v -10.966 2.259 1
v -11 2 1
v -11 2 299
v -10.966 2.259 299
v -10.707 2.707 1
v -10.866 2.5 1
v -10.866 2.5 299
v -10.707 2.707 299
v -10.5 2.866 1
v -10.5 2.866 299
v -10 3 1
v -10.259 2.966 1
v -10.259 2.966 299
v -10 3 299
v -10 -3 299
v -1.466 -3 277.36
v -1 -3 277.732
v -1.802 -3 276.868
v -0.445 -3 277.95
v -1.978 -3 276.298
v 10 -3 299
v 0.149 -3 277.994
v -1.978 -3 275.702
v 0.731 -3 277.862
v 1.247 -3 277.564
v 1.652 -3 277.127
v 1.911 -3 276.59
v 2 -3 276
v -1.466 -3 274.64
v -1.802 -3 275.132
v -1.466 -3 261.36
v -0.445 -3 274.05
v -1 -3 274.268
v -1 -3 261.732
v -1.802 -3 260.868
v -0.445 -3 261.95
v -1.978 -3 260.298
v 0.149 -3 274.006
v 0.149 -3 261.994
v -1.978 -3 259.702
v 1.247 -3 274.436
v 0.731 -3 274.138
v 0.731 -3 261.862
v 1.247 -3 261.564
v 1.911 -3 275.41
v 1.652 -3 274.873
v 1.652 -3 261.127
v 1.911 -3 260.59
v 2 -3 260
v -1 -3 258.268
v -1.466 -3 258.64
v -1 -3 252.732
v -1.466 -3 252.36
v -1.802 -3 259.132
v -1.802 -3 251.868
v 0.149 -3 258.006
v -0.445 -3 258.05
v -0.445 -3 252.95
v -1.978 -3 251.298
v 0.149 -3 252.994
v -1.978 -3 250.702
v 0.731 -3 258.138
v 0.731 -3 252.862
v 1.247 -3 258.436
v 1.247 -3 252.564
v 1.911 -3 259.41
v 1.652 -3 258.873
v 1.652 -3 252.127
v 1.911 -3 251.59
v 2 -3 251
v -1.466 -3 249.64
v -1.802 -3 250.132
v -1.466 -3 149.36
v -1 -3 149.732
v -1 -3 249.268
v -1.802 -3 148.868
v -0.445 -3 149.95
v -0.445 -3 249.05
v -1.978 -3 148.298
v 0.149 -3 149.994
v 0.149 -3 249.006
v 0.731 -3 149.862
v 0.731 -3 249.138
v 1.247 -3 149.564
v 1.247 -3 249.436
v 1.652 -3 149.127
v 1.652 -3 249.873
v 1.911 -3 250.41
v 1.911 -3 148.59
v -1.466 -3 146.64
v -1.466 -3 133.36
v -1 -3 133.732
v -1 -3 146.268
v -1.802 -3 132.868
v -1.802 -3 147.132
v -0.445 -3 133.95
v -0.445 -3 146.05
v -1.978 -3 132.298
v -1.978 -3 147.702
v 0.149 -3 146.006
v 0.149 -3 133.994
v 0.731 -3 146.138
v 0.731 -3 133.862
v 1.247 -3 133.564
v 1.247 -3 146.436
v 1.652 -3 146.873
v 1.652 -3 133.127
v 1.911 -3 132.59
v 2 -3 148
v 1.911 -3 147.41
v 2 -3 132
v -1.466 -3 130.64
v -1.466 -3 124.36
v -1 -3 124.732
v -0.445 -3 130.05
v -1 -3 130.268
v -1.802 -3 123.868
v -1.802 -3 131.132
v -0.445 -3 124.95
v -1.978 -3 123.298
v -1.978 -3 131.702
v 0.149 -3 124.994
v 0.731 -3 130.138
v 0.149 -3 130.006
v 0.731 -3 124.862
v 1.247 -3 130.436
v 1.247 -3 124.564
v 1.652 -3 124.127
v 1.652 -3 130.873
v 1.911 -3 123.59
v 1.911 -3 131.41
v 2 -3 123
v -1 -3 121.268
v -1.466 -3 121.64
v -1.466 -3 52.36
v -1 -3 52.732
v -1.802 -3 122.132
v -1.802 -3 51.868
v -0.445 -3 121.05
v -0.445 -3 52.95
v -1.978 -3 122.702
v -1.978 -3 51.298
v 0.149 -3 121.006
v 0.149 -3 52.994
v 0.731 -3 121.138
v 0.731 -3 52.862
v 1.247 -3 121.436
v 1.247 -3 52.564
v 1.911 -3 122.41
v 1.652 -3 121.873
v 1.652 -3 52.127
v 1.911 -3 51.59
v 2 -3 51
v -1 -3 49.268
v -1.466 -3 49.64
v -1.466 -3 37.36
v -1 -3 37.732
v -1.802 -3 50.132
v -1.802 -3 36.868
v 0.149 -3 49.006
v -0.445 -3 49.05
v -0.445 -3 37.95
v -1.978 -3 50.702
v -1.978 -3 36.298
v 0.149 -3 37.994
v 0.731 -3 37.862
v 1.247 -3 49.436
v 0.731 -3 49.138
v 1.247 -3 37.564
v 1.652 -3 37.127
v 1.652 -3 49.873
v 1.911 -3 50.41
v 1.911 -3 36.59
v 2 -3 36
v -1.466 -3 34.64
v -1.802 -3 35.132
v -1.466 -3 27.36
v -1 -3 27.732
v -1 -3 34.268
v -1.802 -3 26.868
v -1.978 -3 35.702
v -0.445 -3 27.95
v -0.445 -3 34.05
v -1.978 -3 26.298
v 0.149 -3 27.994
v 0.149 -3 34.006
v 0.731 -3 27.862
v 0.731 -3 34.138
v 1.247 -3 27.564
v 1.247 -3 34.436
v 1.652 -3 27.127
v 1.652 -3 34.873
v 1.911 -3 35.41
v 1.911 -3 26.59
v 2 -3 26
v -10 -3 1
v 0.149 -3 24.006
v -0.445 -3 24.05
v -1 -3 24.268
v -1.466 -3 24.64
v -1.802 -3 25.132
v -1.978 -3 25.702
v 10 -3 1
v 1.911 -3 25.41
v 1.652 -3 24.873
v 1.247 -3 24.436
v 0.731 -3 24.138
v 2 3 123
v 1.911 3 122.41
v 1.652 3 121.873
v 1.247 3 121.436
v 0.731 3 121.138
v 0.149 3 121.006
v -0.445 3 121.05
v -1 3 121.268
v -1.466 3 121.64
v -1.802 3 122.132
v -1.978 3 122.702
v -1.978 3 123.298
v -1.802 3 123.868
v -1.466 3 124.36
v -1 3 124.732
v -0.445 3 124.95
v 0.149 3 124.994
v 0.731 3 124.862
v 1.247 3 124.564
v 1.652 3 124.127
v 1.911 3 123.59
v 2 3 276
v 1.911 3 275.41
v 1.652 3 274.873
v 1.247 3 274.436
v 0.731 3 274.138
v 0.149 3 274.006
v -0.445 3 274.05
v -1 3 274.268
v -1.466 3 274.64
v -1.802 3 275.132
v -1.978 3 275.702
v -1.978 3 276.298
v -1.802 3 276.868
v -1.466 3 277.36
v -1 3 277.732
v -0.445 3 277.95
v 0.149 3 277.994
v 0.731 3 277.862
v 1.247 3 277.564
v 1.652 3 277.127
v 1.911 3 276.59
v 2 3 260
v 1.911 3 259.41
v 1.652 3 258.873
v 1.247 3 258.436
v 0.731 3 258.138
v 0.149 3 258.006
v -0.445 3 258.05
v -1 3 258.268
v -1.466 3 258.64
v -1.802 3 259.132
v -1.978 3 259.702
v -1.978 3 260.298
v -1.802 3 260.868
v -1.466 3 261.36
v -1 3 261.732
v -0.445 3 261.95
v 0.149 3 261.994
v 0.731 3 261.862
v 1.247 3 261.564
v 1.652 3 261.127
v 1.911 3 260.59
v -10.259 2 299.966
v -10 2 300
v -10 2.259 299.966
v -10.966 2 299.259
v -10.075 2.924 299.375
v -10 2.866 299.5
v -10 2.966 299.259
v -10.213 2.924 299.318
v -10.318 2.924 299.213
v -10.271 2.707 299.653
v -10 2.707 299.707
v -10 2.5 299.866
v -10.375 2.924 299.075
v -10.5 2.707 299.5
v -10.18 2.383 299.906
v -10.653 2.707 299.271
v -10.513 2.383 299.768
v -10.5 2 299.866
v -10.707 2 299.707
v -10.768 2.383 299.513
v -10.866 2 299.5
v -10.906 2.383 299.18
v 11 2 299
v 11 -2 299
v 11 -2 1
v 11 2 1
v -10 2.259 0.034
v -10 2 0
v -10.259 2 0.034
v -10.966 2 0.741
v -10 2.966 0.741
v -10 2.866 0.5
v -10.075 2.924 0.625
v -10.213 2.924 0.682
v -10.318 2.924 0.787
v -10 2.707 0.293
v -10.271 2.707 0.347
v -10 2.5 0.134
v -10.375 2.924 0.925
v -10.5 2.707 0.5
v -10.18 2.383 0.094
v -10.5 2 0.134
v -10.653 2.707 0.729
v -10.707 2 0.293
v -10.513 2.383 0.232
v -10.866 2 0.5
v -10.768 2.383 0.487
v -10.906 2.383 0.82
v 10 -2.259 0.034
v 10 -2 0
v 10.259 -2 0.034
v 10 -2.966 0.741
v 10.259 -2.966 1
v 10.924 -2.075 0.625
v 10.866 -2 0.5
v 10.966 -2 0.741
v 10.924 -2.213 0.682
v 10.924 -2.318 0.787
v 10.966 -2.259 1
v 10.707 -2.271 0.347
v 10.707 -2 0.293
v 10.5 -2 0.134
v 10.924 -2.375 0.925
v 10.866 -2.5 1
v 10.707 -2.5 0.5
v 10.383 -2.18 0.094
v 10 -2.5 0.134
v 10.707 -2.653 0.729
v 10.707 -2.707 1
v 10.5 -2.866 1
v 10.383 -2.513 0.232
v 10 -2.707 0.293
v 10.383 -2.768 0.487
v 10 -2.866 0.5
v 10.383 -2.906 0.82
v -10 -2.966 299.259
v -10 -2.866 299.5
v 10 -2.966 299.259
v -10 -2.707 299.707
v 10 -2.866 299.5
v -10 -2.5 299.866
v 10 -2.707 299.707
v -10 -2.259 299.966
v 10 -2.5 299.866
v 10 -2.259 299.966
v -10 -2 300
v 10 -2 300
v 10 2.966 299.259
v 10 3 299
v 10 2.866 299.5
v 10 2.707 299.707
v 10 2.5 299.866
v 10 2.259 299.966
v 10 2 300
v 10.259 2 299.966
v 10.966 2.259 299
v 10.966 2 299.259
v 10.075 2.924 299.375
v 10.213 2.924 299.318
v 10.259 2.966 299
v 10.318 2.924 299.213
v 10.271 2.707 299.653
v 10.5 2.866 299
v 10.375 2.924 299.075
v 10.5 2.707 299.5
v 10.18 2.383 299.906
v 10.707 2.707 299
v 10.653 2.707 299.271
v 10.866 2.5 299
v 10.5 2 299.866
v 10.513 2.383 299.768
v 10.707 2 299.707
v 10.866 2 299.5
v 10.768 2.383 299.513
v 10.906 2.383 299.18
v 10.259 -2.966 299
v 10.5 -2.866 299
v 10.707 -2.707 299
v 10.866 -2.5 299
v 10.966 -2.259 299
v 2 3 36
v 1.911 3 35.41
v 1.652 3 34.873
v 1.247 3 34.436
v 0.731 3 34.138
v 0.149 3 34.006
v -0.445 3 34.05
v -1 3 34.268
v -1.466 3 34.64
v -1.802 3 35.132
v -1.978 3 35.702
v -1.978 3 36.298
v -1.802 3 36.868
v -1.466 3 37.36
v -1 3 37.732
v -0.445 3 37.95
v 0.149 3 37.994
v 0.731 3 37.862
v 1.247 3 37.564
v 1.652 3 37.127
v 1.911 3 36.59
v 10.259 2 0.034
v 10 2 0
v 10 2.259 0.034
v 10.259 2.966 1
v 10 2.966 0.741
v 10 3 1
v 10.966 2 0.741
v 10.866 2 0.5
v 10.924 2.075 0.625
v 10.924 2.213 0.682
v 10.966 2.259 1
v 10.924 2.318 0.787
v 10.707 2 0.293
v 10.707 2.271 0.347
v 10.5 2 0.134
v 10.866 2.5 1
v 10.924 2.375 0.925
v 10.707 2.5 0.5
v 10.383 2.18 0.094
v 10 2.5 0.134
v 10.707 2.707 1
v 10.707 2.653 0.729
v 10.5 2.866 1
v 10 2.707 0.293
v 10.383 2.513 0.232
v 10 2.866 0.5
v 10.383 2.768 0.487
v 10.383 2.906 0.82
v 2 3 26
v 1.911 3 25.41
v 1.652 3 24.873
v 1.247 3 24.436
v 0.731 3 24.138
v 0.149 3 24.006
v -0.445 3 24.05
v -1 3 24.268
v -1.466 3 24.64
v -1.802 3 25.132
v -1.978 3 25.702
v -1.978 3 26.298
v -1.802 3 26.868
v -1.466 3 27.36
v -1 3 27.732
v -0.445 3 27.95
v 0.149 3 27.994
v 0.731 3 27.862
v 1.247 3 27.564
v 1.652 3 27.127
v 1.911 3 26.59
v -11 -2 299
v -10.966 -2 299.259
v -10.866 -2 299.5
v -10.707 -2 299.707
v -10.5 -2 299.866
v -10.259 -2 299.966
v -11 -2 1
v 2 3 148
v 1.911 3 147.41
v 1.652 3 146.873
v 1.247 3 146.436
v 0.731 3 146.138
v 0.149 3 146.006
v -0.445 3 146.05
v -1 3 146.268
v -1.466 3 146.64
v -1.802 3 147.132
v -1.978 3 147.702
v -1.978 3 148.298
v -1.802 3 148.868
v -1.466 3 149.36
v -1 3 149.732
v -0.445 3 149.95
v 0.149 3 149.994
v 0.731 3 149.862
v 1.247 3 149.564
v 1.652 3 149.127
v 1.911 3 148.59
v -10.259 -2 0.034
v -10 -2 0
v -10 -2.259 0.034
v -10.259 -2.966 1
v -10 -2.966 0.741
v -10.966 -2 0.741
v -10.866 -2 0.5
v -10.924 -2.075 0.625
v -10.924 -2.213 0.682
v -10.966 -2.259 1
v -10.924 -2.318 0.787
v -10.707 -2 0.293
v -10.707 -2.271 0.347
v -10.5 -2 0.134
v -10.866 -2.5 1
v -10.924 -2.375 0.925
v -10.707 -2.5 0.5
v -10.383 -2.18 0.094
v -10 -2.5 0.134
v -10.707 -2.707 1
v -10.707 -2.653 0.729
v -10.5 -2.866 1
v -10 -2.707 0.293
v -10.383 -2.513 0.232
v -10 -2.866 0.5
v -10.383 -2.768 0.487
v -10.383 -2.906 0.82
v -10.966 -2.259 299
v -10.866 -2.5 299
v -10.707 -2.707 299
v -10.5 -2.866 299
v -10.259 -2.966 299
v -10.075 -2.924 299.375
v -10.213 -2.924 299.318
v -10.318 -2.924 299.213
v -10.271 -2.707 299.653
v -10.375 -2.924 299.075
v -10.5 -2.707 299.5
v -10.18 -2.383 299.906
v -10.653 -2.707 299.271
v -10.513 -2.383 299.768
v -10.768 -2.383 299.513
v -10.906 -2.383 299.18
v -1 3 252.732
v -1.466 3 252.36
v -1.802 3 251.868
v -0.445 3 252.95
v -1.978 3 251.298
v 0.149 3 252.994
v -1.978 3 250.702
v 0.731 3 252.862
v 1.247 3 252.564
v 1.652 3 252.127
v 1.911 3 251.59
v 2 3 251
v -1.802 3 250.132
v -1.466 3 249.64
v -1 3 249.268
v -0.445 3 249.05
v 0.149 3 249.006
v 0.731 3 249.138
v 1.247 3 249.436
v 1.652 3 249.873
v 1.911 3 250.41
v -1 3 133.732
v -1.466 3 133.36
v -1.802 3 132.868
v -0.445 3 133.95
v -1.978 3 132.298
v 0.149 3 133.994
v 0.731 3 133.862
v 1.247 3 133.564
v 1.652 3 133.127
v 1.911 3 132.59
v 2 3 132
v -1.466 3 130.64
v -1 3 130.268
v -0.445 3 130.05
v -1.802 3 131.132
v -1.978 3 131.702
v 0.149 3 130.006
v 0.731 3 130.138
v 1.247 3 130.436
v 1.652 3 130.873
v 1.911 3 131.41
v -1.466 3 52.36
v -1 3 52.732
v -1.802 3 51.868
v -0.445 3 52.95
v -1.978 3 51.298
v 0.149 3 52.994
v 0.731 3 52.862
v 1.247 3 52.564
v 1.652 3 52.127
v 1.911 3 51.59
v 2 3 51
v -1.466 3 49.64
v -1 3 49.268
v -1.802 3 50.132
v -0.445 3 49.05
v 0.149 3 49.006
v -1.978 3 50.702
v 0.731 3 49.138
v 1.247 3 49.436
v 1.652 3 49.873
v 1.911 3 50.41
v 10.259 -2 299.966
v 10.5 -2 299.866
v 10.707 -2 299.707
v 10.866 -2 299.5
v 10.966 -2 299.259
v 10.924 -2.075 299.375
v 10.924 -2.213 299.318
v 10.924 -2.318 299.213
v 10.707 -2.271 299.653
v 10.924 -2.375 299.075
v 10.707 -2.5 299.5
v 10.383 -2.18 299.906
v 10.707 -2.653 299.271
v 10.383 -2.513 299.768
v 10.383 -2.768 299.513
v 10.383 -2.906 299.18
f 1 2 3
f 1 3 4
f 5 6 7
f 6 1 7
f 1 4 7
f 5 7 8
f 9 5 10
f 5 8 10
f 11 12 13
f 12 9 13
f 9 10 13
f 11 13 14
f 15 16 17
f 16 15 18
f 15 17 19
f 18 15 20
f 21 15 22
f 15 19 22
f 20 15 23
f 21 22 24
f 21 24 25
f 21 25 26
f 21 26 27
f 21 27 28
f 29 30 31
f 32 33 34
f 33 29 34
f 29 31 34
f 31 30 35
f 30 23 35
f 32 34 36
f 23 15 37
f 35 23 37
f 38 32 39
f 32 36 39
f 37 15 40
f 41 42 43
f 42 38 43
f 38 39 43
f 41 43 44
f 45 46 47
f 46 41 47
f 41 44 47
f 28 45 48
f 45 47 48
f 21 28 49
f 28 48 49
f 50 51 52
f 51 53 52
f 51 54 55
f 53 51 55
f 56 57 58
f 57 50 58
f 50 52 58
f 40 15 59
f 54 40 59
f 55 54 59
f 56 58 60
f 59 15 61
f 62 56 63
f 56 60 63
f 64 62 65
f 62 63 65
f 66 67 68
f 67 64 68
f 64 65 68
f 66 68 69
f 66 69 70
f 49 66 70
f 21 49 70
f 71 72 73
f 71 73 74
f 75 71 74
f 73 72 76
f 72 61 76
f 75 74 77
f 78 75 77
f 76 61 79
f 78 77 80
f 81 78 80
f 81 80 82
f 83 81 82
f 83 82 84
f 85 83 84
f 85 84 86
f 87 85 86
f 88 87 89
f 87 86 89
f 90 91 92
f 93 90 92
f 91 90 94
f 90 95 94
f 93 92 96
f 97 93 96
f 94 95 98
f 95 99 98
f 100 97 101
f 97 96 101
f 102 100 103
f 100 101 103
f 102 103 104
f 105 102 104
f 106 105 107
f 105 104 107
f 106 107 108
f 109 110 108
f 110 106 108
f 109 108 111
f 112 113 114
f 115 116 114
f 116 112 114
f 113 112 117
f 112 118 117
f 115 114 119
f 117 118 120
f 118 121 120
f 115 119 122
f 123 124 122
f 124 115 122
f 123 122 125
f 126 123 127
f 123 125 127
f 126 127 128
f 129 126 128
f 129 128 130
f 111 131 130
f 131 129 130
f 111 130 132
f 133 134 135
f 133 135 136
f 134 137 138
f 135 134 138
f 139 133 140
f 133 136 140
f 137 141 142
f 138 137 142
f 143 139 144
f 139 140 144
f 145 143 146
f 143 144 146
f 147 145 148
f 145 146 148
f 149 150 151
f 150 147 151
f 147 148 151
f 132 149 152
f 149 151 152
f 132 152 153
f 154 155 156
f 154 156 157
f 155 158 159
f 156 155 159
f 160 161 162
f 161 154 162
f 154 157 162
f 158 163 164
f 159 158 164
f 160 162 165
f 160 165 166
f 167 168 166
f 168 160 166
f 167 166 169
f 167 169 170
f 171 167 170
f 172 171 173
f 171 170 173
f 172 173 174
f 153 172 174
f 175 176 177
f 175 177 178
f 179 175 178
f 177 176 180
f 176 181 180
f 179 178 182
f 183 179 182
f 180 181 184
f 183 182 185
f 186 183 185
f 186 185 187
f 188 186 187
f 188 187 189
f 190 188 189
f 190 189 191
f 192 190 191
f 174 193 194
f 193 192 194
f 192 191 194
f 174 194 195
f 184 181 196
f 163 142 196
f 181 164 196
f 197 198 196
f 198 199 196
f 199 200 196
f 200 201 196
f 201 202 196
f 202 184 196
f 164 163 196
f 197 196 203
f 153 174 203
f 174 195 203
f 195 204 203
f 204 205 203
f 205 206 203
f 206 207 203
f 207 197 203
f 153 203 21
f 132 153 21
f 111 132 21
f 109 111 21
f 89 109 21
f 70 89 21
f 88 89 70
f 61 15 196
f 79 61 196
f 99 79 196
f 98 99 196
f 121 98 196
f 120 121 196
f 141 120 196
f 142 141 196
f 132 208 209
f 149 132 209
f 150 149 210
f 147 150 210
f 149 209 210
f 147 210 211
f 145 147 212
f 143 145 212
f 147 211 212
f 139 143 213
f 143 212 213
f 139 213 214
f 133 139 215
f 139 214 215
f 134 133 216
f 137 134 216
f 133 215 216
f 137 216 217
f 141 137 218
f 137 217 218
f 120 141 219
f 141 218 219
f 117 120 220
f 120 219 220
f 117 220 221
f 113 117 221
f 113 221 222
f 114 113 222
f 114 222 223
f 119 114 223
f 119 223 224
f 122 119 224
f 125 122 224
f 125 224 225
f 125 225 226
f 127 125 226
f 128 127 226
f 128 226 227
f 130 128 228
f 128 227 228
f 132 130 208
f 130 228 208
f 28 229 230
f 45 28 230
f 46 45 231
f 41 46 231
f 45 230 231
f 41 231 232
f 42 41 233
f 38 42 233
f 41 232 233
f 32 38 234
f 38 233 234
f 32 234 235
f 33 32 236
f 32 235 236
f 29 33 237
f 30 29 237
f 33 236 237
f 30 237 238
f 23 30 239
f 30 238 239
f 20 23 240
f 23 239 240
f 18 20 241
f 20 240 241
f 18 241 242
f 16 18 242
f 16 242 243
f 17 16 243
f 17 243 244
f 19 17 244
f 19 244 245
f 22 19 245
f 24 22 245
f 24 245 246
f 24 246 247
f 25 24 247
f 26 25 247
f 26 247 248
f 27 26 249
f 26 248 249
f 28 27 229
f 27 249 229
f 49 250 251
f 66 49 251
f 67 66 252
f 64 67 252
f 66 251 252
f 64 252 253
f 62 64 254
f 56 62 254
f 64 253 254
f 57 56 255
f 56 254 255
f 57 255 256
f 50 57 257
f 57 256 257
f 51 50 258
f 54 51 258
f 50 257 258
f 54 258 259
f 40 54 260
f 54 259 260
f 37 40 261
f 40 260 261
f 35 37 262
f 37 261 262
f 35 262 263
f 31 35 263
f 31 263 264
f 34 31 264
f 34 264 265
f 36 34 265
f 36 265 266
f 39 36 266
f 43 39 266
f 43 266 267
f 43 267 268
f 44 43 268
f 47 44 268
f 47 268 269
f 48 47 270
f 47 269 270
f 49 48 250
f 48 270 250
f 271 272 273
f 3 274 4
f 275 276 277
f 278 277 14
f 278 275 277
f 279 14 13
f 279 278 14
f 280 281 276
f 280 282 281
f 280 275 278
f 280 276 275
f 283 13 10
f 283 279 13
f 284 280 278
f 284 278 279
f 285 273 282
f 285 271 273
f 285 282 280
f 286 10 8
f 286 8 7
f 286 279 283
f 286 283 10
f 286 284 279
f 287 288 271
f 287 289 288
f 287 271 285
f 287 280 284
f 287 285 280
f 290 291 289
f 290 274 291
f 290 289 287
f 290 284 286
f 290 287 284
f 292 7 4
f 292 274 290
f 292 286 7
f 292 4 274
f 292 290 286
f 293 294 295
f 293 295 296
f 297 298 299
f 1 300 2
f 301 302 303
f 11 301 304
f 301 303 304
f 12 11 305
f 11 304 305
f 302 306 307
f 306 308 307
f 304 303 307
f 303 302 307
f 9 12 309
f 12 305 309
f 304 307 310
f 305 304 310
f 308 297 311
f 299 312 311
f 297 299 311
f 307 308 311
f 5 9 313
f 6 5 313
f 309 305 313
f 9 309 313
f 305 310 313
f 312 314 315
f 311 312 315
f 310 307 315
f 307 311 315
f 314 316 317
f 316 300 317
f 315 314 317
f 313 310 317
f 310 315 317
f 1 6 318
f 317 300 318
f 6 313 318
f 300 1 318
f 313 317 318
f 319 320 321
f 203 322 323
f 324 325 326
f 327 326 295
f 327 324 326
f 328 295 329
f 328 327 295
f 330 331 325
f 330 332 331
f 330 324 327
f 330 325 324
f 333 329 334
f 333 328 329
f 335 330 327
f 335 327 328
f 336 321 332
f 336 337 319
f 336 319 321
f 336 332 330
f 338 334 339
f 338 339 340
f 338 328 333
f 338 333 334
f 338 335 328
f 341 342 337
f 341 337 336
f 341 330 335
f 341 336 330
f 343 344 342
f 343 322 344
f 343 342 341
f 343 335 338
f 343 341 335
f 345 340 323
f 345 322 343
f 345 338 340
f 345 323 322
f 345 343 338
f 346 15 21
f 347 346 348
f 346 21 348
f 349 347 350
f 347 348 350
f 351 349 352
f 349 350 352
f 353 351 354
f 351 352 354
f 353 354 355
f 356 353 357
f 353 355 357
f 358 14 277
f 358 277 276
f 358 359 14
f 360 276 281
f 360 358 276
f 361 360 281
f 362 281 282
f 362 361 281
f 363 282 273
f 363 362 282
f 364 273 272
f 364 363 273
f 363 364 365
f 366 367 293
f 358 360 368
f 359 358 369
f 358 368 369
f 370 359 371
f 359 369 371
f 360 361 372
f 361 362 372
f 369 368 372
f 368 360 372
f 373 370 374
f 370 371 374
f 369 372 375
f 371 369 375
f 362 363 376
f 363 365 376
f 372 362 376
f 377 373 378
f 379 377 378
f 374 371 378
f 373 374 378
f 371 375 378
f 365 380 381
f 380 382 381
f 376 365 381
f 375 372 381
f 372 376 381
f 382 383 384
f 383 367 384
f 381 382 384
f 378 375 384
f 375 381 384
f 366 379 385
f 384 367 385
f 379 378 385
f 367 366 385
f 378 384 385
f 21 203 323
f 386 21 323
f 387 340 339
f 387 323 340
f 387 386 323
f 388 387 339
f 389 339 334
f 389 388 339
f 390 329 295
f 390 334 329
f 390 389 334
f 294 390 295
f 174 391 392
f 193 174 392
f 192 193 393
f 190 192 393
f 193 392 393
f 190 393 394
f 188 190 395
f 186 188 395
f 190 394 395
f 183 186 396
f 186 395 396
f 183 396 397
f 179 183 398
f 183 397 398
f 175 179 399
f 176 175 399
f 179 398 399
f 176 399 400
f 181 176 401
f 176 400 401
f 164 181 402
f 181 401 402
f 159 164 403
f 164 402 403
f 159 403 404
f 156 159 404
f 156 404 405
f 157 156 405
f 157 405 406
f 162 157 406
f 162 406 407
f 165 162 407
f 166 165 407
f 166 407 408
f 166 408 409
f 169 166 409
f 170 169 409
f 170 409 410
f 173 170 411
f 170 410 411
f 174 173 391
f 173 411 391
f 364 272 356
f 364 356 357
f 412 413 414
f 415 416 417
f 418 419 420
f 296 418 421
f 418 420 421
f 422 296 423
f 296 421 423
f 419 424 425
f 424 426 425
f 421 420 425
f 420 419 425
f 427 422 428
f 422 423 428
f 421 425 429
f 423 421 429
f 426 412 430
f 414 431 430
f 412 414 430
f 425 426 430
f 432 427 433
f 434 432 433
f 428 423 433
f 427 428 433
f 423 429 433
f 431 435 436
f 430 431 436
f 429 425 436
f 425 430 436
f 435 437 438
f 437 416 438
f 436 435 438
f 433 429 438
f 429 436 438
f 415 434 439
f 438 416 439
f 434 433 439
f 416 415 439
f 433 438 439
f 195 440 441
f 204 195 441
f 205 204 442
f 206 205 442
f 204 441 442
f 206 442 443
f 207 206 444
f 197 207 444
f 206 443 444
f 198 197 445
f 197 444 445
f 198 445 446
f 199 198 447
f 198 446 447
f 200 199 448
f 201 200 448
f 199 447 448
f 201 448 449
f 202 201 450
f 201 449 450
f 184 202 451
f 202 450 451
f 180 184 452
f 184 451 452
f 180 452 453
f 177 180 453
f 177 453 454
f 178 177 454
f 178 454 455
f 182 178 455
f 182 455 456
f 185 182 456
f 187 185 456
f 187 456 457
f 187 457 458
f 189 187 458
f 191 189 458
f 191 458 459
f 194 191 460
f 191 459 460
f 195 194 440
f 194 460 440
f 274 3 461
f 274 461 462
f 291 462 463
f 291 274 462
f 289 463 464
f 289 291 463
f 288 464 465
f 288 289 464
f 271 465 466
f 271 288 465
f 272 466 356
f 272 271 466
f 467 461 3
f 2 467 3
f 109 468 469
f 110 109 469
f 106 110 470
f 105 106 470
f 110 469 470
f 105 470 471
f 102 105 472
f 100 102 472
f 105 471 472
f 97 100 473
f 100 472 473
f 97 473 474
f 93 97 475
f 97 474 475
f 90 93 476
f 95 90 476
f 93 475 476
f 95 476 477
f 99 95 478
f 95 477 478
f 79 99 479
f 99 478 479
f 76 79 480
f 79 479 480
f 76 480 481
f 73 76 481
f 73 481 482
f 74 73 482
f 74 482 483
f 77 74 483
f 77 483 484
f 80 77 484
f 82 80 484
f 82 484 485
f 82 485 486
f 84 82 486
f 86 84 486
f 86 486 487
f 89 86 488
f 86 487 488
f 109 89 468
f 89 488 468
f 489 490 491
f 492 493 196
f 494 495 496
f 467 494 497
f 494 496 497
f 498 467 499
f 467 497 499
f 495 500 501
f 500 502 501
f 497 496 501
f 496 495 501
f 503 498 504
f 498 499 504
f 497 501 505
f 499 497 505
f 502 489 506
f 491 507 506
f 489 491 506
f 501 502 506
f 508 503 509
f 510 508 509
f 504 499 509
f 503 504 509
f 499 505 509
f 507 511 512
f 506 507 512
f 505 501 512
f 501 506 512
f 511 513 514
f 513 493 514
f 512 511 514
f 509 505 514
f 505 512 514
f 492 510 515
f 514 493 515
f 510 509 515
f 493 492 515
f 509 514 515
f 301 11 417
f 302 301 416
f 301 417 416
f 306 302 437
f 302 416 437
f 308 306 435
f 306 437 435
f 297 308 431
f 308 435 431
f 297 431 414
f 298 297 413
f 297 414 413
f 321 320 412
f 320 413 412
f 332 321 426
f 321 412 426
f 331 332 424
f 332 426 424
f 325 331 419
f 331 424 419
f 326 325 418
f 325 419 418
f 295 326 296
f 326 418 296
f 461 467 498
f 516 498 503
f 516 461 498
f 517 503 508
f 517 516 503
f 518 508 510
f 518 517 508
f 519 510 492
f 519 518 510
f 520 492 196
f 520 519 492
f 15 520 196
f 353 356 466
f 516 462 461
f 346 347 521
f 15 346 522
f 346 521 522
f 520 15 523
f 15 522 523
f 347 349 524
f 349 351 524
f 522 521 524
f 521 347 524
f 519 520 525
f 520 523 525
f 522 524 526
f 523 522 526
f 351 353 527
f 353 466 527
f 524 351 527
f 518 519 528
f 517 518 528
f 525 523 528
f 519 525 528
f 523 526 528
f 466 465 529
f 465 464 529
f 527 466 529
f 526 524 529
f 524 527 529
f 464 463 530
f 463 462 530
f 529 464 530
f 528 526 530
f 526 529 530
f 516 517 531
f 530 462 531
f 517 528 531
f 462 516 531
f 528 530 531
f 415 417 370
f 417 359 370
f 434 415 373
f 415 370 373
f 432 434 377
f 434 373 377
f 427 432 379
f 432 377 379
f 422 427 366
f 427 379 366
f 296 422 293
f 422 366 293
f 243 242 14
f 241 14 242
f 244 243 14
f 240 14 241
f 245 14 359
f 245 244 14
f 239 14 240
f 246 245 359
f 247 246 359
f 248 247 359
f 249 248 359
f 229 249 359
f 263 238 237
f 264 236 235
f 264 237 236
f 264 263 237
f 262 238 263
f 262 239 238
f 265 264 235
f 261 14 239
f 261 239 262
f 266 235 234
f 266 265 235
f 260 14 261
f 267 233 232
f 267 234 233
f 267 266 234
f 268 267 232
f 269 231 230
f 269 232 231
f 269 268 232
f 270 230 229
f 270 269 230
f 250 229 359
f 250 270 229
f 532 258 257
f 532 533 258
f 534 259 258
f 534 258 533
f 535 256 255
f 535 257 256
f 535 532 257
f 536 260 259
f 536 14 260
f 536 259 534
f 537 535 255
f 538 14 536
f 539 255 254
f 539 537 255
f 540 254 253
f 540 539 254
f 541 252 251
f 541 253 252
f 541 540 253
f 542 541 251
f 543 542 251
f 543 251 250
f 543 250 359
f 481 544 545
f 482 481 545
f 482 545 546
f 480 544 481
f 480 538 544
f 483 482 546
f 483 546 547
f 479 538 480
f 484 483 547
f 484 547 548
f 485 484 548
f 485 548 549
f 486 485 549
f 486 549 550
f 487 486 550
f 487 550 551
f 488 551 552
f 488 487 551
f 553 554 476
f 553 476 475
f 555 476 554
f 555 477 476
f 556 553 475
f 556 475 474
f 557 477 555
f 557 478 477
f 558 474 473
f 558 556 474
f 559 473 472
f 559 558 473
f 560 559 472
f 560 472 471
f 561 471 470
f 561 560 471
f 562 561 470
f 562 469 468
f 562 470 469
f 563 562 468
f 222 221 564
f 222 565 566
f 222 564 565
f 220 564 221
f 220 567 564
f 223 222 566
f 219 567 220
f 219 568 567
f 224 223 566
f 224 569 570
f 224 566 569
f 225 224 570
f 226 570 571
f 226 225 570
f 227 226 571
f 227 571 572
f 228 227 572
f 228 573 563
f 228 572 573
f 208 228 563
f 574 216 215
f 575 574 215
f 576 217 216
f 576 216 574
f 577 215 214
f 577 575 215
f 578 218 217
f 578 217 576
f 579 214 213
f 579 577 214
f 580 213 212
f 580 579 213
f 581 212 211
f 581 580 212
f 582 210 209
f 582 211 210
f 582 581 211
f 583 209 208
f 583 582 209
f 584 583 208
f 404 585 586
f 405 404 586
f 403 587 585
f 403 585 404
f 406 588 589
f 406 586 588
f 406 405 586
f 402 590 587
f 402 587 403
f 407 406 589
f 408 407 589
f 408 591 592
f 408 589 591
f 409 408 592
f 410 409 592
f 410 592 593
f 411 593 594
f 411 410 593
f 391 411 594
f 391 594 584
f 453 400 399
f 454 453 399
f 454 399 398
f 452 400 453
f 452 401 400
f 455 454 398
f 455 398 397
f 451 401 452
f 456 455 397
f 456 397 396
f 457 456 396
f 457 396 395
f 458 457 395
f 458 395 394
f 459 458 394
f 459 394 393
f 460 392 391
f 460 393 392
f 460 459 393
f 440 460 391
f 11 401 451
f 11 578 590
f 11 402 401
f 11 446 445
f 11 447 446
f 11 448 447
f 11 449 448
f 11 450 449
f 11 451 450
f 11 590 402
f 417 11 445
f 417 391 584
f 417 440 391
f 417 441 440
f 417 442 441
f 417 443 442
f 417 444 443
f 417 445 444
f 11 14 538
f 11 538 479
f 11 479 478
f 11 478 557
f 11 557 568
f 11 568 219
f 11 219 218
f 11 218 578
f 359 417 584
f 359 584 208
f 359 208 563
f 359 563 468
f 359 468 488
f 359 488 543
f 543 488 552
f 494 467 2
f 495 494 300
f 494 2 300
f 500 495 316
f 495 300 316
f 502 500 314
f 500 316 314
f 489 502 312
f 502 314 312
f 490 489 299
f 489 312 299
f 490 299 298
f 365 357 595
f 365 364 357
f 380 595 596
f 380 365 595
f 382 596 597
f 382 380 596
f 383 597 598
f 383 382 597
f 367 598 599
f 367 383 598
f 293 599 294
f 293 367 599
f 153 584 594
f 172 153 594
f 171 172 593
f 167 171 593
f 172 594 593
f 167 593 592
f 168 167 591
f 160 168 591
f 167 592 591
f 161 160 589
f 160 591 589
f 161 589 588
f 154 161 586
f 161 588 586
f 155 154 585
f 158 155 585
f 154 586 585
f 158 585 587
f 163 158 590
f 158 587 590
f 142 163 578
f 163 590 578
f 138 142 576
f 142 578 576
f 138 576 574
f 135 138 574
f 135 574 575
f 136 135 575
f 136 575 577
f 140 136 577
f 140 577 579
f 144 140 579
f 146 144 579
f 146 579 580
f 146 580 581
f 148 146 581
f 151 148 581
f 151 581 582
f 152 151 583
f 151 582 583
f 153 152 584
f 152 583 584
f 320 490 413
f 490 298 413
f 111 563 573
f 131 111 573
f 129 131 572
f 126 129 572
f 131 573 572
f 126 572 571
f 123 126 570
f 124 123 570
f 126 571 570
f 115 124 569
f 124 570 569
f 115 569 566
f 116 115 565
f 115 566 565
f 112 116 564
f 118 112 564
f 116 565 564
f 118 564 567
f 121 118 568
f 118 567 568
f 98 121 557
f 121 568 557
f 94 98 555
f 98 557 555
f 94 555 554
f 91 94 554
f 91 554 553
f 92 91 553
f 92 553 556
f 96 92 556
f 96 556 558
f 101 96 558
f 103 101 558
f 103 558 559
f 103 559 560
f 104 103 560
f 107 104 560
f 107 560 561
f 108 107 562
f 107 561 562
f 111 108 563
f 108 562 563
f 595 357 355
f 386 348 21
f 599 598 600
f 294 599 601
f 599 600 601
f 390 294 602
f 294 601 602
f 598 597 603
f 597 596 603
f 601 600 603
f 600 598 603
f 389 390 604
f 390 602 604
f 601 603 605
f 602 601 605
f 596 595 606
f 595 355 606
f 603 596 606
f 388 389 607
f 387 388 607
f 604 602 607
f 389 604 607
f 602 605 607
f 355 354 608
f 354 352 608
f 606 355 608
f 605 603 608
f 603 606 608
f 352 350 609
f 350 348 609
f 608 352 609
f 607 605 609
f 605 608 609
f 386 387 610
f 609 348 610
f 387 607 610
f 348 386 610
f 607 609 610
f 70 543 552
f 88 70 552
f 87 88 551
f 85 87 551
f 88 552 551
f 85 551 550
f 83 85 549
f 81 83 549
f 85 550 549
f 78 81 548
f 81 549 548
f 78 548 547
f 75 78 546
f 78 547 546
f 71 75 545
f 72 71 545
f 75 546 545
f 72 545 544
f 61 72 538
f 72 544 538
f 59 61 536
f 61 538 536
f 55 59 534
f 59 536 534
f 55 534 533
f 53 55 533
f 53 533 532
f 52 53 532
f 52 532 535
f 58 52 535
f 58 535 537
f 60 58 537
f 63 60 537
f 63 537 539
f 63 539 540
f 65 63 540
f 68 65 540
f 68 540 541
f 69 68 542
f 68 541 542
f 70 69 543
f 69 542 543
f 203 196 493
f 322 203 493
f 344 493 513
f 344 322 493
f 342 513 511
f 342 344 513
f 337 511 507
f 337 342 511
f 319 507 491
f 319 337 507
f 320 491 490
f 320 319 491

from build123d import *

# Parameters (mm, degrees)
SKETCH1_W           = 22
SKETCH1_H           = 6
BOSS_EXTRUDE1_DEPTH = 300
SKETCH3_R           = 2
CUT_EXTRUDE1_DEPTH  = 6
FILLET1_R           = 1


with BuildPart() as part:
    # Sketch1 → Boss-Extrude1 (new body)
    with BuildSketch(Plane.XY):
        Rectangle(SKETCH1_W, SKETCH1_H)
    extrude(amount=BOSS_EXTRUDE1_DEPTH)

    # Sketch3 → Cut-Extrude1 (cut)
    with BuildSketch(Plane(origin=(0, 3, 0), x_dir=(1, 0, 0), z_dir=(0, 1, 0))):
        with Locations((0, -26)):
            Circle(SKETCH3_R)
        with Locations((0, -36)):
            Circle(SKETCH3_R)
        with Locations((0, -51)):
            Circle(SKETCH3_R)
        with Locations((0, -260)):
            Circle(SKETCH3_R)
        with Locations((0, -276)):
            Circle(SKETCH3_R)
        with Locations((0, -251)):
            Circle(SKETCH3_R)
        with Locations((0, -148)):
            Circle(SKETCH3_R)
        with Locations((0, -123)):
            Circle(SKETCH3_R)
        with Locations((0, -132)):
            Circle(SKETCH3_R)
    extrude(amount=-CUT_EXTRUDE1_DEPTH, mode=Mode.SUBTRACT)

    # Fillet1
    fillet1_edges = [part.edges().sort_by_distance(p)[0] for p in [
        (-11, 0, 300),
        (0, -3, 300),
        (11, 0, 300),
        (0, -3, 0),
        (-11, 0, 0),
        (0, 3, 0),
        (11, 0, 0),
        (0, 3, 300),
        (11, -3, 150),
        (-11, -3, 150),
        (-11, 3, 150),
        (11, 3, 150),
    ]]
    fillet(fillet1_edges, radius=FILLET1_R)


solid = part.part
